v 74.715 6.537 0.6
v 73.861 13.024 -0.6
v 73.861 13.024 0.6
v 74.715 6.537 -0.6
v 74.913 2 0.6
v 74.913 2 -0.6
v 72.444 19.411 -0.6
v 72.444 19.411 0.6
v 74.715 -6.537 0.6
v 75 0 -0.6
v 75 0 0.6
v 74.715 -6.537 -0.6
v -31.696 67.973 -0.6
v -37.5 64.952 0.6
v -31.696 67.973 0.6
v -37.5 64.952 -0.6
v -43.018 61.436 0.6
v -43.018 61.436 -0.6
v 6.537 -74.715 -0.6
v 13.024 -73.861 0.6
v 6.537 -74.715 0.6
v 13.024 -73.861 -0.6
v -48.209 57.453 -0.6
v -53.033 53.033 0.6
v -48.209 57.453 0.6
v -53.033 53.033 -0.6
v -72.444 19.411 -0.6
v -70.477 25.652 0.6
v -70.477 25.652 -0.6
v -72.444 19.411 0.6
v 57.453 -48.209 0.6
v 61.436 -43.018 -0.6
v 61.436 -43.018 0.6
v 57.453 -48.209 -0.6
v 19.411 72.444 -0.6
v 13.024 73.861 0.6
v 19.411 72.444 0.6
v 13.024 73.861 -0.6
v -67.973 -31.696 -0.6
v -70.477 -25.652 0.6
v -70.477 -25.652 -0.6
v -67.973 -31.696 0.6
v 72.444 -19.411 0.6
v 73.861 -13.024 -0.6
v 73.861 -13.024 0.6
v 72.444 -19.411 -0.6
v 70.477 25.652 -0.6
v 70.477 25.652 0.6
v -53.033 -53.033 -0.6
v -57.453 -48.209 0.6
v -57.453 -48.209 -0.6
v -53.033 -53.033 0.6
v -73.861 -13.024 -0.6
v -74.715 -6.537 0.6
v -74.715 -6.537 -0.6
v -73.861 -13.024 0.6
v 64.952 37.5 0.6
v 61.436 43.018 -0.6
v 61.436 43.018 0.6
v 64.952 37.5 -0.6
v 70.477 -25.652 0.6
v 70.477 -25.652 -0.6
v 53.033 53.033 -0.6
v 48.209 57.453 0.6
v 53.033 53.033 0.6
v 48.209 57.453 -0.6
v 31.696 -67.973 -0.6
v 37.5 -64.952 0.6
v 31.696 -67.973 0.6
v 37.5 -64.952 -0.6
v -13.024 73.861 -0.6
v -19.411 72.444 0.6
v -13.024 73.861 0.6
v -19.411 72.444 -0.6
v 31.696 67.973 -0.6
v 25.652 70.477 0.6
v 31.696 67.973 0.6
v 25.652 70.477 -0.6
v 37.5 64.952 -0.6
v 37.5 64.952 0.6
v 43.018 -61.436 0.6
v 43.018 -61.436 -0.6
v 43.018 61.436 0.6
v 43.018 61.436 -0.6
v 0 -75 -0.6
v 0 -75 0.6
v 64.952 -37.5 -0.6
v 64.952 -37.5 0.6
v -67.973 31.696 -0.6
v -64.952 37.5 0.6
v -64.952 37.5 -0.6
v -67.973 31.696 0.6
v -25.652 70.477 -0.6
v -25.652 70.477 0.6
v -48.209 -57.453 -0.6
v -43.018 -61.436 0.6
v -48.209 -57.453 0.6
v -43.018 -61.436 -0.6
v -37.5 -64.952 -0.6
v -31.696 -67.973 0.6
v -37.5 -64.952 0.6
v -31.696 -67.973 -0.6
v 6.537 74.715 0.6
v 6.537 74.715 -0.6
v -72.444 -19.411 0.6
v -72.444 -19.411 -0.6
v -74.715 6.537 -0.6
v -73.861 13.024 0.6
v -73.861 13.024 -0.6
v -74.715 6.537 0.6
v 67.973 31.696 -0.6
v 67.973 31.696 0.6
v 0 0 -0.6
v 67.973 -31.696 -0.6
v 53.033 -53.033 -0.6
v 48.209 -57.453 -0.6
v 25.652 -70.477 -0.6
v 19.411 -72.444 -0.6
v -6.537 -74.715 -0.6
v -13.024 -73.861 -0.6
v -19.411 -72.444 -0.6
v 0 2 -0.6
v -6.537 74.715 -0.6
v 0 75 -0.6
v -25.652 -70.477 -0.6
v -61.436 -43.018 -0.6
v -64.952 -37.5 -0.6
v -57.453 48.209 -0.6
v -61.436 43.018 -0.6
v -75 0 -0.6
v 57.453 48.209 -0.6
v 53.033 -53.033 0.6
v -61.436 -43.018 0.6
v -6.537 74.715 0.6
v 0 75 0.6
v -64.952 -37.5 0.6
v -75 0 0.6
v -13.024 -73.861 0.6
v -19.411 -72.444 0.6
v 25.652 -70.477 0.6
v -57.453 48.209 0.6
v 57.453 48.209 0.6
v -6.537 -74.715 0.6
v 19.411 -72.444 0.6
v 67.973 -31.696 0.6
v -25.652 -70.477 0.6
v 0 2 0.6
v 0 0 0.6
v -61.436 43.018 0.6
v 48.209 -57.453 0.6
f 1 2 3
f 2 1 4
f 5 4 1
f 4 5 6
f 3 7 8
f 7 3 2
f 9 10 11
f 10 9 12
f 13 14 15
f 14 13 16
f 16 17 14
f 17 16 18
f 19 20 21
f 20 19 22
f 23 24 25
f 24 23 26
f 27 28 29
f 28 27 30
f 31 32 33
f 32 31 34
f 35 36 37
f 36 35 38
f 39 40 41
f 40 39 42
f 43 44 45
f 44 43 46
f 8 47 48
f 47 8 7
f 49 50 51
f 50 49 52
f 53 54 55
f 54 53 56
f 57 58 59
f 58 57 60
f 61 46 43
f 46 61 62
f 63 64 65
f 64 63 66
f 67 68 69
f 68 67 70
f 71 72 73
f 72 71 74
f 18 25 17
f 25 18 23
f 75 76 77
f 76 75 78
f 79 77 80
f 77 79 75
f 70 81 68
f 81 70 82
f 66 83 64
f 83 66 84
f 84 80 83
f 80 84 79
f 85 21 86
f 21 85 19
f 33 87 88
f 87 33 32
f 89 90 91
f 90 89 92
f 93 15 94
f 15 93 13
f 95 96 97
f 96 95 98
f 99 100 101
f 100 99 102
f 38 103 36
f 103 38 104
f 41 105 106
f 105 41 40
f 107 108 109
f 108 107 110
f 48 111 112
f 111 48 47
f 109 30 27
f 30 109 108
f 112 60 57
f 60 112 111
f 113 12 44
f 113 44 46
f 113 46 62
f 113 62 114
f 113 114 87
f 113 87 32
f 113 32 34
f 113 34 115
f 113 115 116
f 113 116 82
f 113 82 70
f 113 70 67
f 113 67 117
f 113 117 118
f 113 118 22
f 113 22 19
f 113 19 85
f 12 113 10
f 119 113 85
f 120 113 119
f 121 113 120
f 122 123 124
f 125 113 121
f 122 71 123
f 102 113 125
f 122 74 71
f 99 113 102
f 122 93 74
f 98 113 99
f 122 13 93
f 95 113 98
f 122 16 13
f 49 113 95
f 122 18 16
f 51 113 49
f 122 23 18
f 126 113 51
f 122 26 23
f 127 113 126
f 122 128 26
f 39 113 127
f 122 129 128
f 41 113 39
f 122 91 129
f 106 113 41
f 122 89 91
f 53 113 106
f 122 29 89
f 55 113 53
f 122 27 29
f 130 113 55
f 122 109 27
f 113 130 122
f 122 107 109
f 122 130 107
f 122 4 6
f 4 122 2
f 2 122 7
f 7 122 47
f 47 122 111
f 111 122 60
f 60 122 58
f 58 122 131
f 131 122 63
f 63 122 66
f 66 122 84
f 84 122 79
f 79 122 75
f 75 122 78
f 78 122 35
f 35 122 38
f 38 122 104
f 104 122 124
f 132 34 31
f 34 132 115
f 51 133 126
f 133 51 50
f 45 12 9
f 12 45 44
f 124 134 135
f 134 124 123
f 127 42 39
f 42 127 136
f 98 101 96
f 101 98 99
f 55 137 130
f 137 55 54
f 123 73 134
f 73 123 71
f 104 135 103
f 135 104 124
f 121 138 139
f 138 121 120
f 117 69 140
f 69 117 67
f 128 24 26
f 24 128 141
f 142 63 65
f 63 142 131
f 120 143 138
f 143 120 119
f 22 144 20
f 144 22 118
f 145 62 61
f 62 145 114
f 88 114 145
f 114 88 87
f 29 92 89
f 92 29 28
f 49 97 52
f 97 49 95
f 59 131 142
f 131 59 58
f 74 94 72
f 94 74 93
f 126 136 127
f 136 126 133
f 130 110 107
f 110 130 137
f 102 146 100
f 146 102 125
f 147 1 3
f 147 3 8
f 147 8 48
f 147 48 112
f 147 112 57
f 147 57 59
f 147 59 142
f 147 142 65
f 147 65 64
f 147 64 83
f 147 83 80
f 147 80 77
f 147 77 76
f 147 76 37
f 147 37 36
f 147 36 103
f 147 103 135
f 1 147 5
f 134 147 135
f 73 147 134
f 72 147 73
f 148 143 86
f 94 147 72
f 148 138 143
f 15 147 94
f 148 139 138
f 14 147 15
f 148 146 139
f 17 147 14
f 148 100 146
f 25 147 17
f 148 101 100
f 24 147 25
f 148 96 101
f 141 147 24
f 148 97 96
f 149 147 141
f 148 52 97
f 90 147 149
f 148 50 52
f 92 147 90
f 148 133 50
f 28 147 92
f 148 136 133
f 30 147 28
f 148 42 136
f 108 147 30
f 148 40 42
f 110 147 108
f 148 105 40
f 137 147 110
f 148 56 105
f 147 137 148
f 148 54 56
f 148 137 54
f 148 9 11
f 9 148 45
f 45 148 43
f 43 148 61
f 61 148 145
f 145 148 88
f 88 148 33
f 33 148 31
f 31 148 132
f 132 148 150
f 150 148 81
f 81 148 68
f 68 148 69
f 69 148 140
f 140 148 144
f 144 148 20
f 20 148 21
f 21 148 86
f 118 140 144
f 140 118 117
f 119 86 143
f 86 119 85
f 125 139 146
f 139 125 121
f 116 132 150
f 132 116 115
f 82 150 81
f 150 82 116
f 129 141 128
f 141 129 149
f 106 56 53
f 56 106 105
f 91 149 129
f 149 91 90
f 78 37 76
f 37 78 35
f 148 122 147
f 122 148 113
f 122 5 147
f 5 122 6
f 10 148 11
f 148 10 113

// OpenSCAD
// CSG-modules.scad - Basic usage of modules, if, color, $fs/$fa

// Global resolution
$fs = 0.1;  // Don't generate smaller facets than 0.1 mm
$fa = 5;    // Don't generate larger angles than 5 degrees

difference(){
    union(){
    base();/*
        riser1();
        riser2();
            rotate([0,0,90]) riser1();
            rotate([0,0,270]) riser1();
            rotate([0,0,90]) riser2();
            rotate([0,0,270]) riser2();*/        
    }
    baseSlot();
    //rotate([0,0,90]) translate([37.5,0,0]) baseSlot();
    //rotate([0,0,270]) translate([37.5,0,0]) baseSlot();

}


//rotate([0,0,90]) translate([37.5,0,0]) baseASlot();

module base() {
    color("Blue") cylinder(h=1.2, r=75, center=true);
    }
    
module baseSlot() {
    color("Red") translate([0,0,-3]) cube([76, 2, 6]); 
    }
   
module riser1() {
    color("Yellow") translate([37.5,2,1]) cube([34,1.2,3]);
    }    
    
module riser2() {
    color("Green") translate([37.5,-2,1]) cube([34,1.2,3]);
    }
